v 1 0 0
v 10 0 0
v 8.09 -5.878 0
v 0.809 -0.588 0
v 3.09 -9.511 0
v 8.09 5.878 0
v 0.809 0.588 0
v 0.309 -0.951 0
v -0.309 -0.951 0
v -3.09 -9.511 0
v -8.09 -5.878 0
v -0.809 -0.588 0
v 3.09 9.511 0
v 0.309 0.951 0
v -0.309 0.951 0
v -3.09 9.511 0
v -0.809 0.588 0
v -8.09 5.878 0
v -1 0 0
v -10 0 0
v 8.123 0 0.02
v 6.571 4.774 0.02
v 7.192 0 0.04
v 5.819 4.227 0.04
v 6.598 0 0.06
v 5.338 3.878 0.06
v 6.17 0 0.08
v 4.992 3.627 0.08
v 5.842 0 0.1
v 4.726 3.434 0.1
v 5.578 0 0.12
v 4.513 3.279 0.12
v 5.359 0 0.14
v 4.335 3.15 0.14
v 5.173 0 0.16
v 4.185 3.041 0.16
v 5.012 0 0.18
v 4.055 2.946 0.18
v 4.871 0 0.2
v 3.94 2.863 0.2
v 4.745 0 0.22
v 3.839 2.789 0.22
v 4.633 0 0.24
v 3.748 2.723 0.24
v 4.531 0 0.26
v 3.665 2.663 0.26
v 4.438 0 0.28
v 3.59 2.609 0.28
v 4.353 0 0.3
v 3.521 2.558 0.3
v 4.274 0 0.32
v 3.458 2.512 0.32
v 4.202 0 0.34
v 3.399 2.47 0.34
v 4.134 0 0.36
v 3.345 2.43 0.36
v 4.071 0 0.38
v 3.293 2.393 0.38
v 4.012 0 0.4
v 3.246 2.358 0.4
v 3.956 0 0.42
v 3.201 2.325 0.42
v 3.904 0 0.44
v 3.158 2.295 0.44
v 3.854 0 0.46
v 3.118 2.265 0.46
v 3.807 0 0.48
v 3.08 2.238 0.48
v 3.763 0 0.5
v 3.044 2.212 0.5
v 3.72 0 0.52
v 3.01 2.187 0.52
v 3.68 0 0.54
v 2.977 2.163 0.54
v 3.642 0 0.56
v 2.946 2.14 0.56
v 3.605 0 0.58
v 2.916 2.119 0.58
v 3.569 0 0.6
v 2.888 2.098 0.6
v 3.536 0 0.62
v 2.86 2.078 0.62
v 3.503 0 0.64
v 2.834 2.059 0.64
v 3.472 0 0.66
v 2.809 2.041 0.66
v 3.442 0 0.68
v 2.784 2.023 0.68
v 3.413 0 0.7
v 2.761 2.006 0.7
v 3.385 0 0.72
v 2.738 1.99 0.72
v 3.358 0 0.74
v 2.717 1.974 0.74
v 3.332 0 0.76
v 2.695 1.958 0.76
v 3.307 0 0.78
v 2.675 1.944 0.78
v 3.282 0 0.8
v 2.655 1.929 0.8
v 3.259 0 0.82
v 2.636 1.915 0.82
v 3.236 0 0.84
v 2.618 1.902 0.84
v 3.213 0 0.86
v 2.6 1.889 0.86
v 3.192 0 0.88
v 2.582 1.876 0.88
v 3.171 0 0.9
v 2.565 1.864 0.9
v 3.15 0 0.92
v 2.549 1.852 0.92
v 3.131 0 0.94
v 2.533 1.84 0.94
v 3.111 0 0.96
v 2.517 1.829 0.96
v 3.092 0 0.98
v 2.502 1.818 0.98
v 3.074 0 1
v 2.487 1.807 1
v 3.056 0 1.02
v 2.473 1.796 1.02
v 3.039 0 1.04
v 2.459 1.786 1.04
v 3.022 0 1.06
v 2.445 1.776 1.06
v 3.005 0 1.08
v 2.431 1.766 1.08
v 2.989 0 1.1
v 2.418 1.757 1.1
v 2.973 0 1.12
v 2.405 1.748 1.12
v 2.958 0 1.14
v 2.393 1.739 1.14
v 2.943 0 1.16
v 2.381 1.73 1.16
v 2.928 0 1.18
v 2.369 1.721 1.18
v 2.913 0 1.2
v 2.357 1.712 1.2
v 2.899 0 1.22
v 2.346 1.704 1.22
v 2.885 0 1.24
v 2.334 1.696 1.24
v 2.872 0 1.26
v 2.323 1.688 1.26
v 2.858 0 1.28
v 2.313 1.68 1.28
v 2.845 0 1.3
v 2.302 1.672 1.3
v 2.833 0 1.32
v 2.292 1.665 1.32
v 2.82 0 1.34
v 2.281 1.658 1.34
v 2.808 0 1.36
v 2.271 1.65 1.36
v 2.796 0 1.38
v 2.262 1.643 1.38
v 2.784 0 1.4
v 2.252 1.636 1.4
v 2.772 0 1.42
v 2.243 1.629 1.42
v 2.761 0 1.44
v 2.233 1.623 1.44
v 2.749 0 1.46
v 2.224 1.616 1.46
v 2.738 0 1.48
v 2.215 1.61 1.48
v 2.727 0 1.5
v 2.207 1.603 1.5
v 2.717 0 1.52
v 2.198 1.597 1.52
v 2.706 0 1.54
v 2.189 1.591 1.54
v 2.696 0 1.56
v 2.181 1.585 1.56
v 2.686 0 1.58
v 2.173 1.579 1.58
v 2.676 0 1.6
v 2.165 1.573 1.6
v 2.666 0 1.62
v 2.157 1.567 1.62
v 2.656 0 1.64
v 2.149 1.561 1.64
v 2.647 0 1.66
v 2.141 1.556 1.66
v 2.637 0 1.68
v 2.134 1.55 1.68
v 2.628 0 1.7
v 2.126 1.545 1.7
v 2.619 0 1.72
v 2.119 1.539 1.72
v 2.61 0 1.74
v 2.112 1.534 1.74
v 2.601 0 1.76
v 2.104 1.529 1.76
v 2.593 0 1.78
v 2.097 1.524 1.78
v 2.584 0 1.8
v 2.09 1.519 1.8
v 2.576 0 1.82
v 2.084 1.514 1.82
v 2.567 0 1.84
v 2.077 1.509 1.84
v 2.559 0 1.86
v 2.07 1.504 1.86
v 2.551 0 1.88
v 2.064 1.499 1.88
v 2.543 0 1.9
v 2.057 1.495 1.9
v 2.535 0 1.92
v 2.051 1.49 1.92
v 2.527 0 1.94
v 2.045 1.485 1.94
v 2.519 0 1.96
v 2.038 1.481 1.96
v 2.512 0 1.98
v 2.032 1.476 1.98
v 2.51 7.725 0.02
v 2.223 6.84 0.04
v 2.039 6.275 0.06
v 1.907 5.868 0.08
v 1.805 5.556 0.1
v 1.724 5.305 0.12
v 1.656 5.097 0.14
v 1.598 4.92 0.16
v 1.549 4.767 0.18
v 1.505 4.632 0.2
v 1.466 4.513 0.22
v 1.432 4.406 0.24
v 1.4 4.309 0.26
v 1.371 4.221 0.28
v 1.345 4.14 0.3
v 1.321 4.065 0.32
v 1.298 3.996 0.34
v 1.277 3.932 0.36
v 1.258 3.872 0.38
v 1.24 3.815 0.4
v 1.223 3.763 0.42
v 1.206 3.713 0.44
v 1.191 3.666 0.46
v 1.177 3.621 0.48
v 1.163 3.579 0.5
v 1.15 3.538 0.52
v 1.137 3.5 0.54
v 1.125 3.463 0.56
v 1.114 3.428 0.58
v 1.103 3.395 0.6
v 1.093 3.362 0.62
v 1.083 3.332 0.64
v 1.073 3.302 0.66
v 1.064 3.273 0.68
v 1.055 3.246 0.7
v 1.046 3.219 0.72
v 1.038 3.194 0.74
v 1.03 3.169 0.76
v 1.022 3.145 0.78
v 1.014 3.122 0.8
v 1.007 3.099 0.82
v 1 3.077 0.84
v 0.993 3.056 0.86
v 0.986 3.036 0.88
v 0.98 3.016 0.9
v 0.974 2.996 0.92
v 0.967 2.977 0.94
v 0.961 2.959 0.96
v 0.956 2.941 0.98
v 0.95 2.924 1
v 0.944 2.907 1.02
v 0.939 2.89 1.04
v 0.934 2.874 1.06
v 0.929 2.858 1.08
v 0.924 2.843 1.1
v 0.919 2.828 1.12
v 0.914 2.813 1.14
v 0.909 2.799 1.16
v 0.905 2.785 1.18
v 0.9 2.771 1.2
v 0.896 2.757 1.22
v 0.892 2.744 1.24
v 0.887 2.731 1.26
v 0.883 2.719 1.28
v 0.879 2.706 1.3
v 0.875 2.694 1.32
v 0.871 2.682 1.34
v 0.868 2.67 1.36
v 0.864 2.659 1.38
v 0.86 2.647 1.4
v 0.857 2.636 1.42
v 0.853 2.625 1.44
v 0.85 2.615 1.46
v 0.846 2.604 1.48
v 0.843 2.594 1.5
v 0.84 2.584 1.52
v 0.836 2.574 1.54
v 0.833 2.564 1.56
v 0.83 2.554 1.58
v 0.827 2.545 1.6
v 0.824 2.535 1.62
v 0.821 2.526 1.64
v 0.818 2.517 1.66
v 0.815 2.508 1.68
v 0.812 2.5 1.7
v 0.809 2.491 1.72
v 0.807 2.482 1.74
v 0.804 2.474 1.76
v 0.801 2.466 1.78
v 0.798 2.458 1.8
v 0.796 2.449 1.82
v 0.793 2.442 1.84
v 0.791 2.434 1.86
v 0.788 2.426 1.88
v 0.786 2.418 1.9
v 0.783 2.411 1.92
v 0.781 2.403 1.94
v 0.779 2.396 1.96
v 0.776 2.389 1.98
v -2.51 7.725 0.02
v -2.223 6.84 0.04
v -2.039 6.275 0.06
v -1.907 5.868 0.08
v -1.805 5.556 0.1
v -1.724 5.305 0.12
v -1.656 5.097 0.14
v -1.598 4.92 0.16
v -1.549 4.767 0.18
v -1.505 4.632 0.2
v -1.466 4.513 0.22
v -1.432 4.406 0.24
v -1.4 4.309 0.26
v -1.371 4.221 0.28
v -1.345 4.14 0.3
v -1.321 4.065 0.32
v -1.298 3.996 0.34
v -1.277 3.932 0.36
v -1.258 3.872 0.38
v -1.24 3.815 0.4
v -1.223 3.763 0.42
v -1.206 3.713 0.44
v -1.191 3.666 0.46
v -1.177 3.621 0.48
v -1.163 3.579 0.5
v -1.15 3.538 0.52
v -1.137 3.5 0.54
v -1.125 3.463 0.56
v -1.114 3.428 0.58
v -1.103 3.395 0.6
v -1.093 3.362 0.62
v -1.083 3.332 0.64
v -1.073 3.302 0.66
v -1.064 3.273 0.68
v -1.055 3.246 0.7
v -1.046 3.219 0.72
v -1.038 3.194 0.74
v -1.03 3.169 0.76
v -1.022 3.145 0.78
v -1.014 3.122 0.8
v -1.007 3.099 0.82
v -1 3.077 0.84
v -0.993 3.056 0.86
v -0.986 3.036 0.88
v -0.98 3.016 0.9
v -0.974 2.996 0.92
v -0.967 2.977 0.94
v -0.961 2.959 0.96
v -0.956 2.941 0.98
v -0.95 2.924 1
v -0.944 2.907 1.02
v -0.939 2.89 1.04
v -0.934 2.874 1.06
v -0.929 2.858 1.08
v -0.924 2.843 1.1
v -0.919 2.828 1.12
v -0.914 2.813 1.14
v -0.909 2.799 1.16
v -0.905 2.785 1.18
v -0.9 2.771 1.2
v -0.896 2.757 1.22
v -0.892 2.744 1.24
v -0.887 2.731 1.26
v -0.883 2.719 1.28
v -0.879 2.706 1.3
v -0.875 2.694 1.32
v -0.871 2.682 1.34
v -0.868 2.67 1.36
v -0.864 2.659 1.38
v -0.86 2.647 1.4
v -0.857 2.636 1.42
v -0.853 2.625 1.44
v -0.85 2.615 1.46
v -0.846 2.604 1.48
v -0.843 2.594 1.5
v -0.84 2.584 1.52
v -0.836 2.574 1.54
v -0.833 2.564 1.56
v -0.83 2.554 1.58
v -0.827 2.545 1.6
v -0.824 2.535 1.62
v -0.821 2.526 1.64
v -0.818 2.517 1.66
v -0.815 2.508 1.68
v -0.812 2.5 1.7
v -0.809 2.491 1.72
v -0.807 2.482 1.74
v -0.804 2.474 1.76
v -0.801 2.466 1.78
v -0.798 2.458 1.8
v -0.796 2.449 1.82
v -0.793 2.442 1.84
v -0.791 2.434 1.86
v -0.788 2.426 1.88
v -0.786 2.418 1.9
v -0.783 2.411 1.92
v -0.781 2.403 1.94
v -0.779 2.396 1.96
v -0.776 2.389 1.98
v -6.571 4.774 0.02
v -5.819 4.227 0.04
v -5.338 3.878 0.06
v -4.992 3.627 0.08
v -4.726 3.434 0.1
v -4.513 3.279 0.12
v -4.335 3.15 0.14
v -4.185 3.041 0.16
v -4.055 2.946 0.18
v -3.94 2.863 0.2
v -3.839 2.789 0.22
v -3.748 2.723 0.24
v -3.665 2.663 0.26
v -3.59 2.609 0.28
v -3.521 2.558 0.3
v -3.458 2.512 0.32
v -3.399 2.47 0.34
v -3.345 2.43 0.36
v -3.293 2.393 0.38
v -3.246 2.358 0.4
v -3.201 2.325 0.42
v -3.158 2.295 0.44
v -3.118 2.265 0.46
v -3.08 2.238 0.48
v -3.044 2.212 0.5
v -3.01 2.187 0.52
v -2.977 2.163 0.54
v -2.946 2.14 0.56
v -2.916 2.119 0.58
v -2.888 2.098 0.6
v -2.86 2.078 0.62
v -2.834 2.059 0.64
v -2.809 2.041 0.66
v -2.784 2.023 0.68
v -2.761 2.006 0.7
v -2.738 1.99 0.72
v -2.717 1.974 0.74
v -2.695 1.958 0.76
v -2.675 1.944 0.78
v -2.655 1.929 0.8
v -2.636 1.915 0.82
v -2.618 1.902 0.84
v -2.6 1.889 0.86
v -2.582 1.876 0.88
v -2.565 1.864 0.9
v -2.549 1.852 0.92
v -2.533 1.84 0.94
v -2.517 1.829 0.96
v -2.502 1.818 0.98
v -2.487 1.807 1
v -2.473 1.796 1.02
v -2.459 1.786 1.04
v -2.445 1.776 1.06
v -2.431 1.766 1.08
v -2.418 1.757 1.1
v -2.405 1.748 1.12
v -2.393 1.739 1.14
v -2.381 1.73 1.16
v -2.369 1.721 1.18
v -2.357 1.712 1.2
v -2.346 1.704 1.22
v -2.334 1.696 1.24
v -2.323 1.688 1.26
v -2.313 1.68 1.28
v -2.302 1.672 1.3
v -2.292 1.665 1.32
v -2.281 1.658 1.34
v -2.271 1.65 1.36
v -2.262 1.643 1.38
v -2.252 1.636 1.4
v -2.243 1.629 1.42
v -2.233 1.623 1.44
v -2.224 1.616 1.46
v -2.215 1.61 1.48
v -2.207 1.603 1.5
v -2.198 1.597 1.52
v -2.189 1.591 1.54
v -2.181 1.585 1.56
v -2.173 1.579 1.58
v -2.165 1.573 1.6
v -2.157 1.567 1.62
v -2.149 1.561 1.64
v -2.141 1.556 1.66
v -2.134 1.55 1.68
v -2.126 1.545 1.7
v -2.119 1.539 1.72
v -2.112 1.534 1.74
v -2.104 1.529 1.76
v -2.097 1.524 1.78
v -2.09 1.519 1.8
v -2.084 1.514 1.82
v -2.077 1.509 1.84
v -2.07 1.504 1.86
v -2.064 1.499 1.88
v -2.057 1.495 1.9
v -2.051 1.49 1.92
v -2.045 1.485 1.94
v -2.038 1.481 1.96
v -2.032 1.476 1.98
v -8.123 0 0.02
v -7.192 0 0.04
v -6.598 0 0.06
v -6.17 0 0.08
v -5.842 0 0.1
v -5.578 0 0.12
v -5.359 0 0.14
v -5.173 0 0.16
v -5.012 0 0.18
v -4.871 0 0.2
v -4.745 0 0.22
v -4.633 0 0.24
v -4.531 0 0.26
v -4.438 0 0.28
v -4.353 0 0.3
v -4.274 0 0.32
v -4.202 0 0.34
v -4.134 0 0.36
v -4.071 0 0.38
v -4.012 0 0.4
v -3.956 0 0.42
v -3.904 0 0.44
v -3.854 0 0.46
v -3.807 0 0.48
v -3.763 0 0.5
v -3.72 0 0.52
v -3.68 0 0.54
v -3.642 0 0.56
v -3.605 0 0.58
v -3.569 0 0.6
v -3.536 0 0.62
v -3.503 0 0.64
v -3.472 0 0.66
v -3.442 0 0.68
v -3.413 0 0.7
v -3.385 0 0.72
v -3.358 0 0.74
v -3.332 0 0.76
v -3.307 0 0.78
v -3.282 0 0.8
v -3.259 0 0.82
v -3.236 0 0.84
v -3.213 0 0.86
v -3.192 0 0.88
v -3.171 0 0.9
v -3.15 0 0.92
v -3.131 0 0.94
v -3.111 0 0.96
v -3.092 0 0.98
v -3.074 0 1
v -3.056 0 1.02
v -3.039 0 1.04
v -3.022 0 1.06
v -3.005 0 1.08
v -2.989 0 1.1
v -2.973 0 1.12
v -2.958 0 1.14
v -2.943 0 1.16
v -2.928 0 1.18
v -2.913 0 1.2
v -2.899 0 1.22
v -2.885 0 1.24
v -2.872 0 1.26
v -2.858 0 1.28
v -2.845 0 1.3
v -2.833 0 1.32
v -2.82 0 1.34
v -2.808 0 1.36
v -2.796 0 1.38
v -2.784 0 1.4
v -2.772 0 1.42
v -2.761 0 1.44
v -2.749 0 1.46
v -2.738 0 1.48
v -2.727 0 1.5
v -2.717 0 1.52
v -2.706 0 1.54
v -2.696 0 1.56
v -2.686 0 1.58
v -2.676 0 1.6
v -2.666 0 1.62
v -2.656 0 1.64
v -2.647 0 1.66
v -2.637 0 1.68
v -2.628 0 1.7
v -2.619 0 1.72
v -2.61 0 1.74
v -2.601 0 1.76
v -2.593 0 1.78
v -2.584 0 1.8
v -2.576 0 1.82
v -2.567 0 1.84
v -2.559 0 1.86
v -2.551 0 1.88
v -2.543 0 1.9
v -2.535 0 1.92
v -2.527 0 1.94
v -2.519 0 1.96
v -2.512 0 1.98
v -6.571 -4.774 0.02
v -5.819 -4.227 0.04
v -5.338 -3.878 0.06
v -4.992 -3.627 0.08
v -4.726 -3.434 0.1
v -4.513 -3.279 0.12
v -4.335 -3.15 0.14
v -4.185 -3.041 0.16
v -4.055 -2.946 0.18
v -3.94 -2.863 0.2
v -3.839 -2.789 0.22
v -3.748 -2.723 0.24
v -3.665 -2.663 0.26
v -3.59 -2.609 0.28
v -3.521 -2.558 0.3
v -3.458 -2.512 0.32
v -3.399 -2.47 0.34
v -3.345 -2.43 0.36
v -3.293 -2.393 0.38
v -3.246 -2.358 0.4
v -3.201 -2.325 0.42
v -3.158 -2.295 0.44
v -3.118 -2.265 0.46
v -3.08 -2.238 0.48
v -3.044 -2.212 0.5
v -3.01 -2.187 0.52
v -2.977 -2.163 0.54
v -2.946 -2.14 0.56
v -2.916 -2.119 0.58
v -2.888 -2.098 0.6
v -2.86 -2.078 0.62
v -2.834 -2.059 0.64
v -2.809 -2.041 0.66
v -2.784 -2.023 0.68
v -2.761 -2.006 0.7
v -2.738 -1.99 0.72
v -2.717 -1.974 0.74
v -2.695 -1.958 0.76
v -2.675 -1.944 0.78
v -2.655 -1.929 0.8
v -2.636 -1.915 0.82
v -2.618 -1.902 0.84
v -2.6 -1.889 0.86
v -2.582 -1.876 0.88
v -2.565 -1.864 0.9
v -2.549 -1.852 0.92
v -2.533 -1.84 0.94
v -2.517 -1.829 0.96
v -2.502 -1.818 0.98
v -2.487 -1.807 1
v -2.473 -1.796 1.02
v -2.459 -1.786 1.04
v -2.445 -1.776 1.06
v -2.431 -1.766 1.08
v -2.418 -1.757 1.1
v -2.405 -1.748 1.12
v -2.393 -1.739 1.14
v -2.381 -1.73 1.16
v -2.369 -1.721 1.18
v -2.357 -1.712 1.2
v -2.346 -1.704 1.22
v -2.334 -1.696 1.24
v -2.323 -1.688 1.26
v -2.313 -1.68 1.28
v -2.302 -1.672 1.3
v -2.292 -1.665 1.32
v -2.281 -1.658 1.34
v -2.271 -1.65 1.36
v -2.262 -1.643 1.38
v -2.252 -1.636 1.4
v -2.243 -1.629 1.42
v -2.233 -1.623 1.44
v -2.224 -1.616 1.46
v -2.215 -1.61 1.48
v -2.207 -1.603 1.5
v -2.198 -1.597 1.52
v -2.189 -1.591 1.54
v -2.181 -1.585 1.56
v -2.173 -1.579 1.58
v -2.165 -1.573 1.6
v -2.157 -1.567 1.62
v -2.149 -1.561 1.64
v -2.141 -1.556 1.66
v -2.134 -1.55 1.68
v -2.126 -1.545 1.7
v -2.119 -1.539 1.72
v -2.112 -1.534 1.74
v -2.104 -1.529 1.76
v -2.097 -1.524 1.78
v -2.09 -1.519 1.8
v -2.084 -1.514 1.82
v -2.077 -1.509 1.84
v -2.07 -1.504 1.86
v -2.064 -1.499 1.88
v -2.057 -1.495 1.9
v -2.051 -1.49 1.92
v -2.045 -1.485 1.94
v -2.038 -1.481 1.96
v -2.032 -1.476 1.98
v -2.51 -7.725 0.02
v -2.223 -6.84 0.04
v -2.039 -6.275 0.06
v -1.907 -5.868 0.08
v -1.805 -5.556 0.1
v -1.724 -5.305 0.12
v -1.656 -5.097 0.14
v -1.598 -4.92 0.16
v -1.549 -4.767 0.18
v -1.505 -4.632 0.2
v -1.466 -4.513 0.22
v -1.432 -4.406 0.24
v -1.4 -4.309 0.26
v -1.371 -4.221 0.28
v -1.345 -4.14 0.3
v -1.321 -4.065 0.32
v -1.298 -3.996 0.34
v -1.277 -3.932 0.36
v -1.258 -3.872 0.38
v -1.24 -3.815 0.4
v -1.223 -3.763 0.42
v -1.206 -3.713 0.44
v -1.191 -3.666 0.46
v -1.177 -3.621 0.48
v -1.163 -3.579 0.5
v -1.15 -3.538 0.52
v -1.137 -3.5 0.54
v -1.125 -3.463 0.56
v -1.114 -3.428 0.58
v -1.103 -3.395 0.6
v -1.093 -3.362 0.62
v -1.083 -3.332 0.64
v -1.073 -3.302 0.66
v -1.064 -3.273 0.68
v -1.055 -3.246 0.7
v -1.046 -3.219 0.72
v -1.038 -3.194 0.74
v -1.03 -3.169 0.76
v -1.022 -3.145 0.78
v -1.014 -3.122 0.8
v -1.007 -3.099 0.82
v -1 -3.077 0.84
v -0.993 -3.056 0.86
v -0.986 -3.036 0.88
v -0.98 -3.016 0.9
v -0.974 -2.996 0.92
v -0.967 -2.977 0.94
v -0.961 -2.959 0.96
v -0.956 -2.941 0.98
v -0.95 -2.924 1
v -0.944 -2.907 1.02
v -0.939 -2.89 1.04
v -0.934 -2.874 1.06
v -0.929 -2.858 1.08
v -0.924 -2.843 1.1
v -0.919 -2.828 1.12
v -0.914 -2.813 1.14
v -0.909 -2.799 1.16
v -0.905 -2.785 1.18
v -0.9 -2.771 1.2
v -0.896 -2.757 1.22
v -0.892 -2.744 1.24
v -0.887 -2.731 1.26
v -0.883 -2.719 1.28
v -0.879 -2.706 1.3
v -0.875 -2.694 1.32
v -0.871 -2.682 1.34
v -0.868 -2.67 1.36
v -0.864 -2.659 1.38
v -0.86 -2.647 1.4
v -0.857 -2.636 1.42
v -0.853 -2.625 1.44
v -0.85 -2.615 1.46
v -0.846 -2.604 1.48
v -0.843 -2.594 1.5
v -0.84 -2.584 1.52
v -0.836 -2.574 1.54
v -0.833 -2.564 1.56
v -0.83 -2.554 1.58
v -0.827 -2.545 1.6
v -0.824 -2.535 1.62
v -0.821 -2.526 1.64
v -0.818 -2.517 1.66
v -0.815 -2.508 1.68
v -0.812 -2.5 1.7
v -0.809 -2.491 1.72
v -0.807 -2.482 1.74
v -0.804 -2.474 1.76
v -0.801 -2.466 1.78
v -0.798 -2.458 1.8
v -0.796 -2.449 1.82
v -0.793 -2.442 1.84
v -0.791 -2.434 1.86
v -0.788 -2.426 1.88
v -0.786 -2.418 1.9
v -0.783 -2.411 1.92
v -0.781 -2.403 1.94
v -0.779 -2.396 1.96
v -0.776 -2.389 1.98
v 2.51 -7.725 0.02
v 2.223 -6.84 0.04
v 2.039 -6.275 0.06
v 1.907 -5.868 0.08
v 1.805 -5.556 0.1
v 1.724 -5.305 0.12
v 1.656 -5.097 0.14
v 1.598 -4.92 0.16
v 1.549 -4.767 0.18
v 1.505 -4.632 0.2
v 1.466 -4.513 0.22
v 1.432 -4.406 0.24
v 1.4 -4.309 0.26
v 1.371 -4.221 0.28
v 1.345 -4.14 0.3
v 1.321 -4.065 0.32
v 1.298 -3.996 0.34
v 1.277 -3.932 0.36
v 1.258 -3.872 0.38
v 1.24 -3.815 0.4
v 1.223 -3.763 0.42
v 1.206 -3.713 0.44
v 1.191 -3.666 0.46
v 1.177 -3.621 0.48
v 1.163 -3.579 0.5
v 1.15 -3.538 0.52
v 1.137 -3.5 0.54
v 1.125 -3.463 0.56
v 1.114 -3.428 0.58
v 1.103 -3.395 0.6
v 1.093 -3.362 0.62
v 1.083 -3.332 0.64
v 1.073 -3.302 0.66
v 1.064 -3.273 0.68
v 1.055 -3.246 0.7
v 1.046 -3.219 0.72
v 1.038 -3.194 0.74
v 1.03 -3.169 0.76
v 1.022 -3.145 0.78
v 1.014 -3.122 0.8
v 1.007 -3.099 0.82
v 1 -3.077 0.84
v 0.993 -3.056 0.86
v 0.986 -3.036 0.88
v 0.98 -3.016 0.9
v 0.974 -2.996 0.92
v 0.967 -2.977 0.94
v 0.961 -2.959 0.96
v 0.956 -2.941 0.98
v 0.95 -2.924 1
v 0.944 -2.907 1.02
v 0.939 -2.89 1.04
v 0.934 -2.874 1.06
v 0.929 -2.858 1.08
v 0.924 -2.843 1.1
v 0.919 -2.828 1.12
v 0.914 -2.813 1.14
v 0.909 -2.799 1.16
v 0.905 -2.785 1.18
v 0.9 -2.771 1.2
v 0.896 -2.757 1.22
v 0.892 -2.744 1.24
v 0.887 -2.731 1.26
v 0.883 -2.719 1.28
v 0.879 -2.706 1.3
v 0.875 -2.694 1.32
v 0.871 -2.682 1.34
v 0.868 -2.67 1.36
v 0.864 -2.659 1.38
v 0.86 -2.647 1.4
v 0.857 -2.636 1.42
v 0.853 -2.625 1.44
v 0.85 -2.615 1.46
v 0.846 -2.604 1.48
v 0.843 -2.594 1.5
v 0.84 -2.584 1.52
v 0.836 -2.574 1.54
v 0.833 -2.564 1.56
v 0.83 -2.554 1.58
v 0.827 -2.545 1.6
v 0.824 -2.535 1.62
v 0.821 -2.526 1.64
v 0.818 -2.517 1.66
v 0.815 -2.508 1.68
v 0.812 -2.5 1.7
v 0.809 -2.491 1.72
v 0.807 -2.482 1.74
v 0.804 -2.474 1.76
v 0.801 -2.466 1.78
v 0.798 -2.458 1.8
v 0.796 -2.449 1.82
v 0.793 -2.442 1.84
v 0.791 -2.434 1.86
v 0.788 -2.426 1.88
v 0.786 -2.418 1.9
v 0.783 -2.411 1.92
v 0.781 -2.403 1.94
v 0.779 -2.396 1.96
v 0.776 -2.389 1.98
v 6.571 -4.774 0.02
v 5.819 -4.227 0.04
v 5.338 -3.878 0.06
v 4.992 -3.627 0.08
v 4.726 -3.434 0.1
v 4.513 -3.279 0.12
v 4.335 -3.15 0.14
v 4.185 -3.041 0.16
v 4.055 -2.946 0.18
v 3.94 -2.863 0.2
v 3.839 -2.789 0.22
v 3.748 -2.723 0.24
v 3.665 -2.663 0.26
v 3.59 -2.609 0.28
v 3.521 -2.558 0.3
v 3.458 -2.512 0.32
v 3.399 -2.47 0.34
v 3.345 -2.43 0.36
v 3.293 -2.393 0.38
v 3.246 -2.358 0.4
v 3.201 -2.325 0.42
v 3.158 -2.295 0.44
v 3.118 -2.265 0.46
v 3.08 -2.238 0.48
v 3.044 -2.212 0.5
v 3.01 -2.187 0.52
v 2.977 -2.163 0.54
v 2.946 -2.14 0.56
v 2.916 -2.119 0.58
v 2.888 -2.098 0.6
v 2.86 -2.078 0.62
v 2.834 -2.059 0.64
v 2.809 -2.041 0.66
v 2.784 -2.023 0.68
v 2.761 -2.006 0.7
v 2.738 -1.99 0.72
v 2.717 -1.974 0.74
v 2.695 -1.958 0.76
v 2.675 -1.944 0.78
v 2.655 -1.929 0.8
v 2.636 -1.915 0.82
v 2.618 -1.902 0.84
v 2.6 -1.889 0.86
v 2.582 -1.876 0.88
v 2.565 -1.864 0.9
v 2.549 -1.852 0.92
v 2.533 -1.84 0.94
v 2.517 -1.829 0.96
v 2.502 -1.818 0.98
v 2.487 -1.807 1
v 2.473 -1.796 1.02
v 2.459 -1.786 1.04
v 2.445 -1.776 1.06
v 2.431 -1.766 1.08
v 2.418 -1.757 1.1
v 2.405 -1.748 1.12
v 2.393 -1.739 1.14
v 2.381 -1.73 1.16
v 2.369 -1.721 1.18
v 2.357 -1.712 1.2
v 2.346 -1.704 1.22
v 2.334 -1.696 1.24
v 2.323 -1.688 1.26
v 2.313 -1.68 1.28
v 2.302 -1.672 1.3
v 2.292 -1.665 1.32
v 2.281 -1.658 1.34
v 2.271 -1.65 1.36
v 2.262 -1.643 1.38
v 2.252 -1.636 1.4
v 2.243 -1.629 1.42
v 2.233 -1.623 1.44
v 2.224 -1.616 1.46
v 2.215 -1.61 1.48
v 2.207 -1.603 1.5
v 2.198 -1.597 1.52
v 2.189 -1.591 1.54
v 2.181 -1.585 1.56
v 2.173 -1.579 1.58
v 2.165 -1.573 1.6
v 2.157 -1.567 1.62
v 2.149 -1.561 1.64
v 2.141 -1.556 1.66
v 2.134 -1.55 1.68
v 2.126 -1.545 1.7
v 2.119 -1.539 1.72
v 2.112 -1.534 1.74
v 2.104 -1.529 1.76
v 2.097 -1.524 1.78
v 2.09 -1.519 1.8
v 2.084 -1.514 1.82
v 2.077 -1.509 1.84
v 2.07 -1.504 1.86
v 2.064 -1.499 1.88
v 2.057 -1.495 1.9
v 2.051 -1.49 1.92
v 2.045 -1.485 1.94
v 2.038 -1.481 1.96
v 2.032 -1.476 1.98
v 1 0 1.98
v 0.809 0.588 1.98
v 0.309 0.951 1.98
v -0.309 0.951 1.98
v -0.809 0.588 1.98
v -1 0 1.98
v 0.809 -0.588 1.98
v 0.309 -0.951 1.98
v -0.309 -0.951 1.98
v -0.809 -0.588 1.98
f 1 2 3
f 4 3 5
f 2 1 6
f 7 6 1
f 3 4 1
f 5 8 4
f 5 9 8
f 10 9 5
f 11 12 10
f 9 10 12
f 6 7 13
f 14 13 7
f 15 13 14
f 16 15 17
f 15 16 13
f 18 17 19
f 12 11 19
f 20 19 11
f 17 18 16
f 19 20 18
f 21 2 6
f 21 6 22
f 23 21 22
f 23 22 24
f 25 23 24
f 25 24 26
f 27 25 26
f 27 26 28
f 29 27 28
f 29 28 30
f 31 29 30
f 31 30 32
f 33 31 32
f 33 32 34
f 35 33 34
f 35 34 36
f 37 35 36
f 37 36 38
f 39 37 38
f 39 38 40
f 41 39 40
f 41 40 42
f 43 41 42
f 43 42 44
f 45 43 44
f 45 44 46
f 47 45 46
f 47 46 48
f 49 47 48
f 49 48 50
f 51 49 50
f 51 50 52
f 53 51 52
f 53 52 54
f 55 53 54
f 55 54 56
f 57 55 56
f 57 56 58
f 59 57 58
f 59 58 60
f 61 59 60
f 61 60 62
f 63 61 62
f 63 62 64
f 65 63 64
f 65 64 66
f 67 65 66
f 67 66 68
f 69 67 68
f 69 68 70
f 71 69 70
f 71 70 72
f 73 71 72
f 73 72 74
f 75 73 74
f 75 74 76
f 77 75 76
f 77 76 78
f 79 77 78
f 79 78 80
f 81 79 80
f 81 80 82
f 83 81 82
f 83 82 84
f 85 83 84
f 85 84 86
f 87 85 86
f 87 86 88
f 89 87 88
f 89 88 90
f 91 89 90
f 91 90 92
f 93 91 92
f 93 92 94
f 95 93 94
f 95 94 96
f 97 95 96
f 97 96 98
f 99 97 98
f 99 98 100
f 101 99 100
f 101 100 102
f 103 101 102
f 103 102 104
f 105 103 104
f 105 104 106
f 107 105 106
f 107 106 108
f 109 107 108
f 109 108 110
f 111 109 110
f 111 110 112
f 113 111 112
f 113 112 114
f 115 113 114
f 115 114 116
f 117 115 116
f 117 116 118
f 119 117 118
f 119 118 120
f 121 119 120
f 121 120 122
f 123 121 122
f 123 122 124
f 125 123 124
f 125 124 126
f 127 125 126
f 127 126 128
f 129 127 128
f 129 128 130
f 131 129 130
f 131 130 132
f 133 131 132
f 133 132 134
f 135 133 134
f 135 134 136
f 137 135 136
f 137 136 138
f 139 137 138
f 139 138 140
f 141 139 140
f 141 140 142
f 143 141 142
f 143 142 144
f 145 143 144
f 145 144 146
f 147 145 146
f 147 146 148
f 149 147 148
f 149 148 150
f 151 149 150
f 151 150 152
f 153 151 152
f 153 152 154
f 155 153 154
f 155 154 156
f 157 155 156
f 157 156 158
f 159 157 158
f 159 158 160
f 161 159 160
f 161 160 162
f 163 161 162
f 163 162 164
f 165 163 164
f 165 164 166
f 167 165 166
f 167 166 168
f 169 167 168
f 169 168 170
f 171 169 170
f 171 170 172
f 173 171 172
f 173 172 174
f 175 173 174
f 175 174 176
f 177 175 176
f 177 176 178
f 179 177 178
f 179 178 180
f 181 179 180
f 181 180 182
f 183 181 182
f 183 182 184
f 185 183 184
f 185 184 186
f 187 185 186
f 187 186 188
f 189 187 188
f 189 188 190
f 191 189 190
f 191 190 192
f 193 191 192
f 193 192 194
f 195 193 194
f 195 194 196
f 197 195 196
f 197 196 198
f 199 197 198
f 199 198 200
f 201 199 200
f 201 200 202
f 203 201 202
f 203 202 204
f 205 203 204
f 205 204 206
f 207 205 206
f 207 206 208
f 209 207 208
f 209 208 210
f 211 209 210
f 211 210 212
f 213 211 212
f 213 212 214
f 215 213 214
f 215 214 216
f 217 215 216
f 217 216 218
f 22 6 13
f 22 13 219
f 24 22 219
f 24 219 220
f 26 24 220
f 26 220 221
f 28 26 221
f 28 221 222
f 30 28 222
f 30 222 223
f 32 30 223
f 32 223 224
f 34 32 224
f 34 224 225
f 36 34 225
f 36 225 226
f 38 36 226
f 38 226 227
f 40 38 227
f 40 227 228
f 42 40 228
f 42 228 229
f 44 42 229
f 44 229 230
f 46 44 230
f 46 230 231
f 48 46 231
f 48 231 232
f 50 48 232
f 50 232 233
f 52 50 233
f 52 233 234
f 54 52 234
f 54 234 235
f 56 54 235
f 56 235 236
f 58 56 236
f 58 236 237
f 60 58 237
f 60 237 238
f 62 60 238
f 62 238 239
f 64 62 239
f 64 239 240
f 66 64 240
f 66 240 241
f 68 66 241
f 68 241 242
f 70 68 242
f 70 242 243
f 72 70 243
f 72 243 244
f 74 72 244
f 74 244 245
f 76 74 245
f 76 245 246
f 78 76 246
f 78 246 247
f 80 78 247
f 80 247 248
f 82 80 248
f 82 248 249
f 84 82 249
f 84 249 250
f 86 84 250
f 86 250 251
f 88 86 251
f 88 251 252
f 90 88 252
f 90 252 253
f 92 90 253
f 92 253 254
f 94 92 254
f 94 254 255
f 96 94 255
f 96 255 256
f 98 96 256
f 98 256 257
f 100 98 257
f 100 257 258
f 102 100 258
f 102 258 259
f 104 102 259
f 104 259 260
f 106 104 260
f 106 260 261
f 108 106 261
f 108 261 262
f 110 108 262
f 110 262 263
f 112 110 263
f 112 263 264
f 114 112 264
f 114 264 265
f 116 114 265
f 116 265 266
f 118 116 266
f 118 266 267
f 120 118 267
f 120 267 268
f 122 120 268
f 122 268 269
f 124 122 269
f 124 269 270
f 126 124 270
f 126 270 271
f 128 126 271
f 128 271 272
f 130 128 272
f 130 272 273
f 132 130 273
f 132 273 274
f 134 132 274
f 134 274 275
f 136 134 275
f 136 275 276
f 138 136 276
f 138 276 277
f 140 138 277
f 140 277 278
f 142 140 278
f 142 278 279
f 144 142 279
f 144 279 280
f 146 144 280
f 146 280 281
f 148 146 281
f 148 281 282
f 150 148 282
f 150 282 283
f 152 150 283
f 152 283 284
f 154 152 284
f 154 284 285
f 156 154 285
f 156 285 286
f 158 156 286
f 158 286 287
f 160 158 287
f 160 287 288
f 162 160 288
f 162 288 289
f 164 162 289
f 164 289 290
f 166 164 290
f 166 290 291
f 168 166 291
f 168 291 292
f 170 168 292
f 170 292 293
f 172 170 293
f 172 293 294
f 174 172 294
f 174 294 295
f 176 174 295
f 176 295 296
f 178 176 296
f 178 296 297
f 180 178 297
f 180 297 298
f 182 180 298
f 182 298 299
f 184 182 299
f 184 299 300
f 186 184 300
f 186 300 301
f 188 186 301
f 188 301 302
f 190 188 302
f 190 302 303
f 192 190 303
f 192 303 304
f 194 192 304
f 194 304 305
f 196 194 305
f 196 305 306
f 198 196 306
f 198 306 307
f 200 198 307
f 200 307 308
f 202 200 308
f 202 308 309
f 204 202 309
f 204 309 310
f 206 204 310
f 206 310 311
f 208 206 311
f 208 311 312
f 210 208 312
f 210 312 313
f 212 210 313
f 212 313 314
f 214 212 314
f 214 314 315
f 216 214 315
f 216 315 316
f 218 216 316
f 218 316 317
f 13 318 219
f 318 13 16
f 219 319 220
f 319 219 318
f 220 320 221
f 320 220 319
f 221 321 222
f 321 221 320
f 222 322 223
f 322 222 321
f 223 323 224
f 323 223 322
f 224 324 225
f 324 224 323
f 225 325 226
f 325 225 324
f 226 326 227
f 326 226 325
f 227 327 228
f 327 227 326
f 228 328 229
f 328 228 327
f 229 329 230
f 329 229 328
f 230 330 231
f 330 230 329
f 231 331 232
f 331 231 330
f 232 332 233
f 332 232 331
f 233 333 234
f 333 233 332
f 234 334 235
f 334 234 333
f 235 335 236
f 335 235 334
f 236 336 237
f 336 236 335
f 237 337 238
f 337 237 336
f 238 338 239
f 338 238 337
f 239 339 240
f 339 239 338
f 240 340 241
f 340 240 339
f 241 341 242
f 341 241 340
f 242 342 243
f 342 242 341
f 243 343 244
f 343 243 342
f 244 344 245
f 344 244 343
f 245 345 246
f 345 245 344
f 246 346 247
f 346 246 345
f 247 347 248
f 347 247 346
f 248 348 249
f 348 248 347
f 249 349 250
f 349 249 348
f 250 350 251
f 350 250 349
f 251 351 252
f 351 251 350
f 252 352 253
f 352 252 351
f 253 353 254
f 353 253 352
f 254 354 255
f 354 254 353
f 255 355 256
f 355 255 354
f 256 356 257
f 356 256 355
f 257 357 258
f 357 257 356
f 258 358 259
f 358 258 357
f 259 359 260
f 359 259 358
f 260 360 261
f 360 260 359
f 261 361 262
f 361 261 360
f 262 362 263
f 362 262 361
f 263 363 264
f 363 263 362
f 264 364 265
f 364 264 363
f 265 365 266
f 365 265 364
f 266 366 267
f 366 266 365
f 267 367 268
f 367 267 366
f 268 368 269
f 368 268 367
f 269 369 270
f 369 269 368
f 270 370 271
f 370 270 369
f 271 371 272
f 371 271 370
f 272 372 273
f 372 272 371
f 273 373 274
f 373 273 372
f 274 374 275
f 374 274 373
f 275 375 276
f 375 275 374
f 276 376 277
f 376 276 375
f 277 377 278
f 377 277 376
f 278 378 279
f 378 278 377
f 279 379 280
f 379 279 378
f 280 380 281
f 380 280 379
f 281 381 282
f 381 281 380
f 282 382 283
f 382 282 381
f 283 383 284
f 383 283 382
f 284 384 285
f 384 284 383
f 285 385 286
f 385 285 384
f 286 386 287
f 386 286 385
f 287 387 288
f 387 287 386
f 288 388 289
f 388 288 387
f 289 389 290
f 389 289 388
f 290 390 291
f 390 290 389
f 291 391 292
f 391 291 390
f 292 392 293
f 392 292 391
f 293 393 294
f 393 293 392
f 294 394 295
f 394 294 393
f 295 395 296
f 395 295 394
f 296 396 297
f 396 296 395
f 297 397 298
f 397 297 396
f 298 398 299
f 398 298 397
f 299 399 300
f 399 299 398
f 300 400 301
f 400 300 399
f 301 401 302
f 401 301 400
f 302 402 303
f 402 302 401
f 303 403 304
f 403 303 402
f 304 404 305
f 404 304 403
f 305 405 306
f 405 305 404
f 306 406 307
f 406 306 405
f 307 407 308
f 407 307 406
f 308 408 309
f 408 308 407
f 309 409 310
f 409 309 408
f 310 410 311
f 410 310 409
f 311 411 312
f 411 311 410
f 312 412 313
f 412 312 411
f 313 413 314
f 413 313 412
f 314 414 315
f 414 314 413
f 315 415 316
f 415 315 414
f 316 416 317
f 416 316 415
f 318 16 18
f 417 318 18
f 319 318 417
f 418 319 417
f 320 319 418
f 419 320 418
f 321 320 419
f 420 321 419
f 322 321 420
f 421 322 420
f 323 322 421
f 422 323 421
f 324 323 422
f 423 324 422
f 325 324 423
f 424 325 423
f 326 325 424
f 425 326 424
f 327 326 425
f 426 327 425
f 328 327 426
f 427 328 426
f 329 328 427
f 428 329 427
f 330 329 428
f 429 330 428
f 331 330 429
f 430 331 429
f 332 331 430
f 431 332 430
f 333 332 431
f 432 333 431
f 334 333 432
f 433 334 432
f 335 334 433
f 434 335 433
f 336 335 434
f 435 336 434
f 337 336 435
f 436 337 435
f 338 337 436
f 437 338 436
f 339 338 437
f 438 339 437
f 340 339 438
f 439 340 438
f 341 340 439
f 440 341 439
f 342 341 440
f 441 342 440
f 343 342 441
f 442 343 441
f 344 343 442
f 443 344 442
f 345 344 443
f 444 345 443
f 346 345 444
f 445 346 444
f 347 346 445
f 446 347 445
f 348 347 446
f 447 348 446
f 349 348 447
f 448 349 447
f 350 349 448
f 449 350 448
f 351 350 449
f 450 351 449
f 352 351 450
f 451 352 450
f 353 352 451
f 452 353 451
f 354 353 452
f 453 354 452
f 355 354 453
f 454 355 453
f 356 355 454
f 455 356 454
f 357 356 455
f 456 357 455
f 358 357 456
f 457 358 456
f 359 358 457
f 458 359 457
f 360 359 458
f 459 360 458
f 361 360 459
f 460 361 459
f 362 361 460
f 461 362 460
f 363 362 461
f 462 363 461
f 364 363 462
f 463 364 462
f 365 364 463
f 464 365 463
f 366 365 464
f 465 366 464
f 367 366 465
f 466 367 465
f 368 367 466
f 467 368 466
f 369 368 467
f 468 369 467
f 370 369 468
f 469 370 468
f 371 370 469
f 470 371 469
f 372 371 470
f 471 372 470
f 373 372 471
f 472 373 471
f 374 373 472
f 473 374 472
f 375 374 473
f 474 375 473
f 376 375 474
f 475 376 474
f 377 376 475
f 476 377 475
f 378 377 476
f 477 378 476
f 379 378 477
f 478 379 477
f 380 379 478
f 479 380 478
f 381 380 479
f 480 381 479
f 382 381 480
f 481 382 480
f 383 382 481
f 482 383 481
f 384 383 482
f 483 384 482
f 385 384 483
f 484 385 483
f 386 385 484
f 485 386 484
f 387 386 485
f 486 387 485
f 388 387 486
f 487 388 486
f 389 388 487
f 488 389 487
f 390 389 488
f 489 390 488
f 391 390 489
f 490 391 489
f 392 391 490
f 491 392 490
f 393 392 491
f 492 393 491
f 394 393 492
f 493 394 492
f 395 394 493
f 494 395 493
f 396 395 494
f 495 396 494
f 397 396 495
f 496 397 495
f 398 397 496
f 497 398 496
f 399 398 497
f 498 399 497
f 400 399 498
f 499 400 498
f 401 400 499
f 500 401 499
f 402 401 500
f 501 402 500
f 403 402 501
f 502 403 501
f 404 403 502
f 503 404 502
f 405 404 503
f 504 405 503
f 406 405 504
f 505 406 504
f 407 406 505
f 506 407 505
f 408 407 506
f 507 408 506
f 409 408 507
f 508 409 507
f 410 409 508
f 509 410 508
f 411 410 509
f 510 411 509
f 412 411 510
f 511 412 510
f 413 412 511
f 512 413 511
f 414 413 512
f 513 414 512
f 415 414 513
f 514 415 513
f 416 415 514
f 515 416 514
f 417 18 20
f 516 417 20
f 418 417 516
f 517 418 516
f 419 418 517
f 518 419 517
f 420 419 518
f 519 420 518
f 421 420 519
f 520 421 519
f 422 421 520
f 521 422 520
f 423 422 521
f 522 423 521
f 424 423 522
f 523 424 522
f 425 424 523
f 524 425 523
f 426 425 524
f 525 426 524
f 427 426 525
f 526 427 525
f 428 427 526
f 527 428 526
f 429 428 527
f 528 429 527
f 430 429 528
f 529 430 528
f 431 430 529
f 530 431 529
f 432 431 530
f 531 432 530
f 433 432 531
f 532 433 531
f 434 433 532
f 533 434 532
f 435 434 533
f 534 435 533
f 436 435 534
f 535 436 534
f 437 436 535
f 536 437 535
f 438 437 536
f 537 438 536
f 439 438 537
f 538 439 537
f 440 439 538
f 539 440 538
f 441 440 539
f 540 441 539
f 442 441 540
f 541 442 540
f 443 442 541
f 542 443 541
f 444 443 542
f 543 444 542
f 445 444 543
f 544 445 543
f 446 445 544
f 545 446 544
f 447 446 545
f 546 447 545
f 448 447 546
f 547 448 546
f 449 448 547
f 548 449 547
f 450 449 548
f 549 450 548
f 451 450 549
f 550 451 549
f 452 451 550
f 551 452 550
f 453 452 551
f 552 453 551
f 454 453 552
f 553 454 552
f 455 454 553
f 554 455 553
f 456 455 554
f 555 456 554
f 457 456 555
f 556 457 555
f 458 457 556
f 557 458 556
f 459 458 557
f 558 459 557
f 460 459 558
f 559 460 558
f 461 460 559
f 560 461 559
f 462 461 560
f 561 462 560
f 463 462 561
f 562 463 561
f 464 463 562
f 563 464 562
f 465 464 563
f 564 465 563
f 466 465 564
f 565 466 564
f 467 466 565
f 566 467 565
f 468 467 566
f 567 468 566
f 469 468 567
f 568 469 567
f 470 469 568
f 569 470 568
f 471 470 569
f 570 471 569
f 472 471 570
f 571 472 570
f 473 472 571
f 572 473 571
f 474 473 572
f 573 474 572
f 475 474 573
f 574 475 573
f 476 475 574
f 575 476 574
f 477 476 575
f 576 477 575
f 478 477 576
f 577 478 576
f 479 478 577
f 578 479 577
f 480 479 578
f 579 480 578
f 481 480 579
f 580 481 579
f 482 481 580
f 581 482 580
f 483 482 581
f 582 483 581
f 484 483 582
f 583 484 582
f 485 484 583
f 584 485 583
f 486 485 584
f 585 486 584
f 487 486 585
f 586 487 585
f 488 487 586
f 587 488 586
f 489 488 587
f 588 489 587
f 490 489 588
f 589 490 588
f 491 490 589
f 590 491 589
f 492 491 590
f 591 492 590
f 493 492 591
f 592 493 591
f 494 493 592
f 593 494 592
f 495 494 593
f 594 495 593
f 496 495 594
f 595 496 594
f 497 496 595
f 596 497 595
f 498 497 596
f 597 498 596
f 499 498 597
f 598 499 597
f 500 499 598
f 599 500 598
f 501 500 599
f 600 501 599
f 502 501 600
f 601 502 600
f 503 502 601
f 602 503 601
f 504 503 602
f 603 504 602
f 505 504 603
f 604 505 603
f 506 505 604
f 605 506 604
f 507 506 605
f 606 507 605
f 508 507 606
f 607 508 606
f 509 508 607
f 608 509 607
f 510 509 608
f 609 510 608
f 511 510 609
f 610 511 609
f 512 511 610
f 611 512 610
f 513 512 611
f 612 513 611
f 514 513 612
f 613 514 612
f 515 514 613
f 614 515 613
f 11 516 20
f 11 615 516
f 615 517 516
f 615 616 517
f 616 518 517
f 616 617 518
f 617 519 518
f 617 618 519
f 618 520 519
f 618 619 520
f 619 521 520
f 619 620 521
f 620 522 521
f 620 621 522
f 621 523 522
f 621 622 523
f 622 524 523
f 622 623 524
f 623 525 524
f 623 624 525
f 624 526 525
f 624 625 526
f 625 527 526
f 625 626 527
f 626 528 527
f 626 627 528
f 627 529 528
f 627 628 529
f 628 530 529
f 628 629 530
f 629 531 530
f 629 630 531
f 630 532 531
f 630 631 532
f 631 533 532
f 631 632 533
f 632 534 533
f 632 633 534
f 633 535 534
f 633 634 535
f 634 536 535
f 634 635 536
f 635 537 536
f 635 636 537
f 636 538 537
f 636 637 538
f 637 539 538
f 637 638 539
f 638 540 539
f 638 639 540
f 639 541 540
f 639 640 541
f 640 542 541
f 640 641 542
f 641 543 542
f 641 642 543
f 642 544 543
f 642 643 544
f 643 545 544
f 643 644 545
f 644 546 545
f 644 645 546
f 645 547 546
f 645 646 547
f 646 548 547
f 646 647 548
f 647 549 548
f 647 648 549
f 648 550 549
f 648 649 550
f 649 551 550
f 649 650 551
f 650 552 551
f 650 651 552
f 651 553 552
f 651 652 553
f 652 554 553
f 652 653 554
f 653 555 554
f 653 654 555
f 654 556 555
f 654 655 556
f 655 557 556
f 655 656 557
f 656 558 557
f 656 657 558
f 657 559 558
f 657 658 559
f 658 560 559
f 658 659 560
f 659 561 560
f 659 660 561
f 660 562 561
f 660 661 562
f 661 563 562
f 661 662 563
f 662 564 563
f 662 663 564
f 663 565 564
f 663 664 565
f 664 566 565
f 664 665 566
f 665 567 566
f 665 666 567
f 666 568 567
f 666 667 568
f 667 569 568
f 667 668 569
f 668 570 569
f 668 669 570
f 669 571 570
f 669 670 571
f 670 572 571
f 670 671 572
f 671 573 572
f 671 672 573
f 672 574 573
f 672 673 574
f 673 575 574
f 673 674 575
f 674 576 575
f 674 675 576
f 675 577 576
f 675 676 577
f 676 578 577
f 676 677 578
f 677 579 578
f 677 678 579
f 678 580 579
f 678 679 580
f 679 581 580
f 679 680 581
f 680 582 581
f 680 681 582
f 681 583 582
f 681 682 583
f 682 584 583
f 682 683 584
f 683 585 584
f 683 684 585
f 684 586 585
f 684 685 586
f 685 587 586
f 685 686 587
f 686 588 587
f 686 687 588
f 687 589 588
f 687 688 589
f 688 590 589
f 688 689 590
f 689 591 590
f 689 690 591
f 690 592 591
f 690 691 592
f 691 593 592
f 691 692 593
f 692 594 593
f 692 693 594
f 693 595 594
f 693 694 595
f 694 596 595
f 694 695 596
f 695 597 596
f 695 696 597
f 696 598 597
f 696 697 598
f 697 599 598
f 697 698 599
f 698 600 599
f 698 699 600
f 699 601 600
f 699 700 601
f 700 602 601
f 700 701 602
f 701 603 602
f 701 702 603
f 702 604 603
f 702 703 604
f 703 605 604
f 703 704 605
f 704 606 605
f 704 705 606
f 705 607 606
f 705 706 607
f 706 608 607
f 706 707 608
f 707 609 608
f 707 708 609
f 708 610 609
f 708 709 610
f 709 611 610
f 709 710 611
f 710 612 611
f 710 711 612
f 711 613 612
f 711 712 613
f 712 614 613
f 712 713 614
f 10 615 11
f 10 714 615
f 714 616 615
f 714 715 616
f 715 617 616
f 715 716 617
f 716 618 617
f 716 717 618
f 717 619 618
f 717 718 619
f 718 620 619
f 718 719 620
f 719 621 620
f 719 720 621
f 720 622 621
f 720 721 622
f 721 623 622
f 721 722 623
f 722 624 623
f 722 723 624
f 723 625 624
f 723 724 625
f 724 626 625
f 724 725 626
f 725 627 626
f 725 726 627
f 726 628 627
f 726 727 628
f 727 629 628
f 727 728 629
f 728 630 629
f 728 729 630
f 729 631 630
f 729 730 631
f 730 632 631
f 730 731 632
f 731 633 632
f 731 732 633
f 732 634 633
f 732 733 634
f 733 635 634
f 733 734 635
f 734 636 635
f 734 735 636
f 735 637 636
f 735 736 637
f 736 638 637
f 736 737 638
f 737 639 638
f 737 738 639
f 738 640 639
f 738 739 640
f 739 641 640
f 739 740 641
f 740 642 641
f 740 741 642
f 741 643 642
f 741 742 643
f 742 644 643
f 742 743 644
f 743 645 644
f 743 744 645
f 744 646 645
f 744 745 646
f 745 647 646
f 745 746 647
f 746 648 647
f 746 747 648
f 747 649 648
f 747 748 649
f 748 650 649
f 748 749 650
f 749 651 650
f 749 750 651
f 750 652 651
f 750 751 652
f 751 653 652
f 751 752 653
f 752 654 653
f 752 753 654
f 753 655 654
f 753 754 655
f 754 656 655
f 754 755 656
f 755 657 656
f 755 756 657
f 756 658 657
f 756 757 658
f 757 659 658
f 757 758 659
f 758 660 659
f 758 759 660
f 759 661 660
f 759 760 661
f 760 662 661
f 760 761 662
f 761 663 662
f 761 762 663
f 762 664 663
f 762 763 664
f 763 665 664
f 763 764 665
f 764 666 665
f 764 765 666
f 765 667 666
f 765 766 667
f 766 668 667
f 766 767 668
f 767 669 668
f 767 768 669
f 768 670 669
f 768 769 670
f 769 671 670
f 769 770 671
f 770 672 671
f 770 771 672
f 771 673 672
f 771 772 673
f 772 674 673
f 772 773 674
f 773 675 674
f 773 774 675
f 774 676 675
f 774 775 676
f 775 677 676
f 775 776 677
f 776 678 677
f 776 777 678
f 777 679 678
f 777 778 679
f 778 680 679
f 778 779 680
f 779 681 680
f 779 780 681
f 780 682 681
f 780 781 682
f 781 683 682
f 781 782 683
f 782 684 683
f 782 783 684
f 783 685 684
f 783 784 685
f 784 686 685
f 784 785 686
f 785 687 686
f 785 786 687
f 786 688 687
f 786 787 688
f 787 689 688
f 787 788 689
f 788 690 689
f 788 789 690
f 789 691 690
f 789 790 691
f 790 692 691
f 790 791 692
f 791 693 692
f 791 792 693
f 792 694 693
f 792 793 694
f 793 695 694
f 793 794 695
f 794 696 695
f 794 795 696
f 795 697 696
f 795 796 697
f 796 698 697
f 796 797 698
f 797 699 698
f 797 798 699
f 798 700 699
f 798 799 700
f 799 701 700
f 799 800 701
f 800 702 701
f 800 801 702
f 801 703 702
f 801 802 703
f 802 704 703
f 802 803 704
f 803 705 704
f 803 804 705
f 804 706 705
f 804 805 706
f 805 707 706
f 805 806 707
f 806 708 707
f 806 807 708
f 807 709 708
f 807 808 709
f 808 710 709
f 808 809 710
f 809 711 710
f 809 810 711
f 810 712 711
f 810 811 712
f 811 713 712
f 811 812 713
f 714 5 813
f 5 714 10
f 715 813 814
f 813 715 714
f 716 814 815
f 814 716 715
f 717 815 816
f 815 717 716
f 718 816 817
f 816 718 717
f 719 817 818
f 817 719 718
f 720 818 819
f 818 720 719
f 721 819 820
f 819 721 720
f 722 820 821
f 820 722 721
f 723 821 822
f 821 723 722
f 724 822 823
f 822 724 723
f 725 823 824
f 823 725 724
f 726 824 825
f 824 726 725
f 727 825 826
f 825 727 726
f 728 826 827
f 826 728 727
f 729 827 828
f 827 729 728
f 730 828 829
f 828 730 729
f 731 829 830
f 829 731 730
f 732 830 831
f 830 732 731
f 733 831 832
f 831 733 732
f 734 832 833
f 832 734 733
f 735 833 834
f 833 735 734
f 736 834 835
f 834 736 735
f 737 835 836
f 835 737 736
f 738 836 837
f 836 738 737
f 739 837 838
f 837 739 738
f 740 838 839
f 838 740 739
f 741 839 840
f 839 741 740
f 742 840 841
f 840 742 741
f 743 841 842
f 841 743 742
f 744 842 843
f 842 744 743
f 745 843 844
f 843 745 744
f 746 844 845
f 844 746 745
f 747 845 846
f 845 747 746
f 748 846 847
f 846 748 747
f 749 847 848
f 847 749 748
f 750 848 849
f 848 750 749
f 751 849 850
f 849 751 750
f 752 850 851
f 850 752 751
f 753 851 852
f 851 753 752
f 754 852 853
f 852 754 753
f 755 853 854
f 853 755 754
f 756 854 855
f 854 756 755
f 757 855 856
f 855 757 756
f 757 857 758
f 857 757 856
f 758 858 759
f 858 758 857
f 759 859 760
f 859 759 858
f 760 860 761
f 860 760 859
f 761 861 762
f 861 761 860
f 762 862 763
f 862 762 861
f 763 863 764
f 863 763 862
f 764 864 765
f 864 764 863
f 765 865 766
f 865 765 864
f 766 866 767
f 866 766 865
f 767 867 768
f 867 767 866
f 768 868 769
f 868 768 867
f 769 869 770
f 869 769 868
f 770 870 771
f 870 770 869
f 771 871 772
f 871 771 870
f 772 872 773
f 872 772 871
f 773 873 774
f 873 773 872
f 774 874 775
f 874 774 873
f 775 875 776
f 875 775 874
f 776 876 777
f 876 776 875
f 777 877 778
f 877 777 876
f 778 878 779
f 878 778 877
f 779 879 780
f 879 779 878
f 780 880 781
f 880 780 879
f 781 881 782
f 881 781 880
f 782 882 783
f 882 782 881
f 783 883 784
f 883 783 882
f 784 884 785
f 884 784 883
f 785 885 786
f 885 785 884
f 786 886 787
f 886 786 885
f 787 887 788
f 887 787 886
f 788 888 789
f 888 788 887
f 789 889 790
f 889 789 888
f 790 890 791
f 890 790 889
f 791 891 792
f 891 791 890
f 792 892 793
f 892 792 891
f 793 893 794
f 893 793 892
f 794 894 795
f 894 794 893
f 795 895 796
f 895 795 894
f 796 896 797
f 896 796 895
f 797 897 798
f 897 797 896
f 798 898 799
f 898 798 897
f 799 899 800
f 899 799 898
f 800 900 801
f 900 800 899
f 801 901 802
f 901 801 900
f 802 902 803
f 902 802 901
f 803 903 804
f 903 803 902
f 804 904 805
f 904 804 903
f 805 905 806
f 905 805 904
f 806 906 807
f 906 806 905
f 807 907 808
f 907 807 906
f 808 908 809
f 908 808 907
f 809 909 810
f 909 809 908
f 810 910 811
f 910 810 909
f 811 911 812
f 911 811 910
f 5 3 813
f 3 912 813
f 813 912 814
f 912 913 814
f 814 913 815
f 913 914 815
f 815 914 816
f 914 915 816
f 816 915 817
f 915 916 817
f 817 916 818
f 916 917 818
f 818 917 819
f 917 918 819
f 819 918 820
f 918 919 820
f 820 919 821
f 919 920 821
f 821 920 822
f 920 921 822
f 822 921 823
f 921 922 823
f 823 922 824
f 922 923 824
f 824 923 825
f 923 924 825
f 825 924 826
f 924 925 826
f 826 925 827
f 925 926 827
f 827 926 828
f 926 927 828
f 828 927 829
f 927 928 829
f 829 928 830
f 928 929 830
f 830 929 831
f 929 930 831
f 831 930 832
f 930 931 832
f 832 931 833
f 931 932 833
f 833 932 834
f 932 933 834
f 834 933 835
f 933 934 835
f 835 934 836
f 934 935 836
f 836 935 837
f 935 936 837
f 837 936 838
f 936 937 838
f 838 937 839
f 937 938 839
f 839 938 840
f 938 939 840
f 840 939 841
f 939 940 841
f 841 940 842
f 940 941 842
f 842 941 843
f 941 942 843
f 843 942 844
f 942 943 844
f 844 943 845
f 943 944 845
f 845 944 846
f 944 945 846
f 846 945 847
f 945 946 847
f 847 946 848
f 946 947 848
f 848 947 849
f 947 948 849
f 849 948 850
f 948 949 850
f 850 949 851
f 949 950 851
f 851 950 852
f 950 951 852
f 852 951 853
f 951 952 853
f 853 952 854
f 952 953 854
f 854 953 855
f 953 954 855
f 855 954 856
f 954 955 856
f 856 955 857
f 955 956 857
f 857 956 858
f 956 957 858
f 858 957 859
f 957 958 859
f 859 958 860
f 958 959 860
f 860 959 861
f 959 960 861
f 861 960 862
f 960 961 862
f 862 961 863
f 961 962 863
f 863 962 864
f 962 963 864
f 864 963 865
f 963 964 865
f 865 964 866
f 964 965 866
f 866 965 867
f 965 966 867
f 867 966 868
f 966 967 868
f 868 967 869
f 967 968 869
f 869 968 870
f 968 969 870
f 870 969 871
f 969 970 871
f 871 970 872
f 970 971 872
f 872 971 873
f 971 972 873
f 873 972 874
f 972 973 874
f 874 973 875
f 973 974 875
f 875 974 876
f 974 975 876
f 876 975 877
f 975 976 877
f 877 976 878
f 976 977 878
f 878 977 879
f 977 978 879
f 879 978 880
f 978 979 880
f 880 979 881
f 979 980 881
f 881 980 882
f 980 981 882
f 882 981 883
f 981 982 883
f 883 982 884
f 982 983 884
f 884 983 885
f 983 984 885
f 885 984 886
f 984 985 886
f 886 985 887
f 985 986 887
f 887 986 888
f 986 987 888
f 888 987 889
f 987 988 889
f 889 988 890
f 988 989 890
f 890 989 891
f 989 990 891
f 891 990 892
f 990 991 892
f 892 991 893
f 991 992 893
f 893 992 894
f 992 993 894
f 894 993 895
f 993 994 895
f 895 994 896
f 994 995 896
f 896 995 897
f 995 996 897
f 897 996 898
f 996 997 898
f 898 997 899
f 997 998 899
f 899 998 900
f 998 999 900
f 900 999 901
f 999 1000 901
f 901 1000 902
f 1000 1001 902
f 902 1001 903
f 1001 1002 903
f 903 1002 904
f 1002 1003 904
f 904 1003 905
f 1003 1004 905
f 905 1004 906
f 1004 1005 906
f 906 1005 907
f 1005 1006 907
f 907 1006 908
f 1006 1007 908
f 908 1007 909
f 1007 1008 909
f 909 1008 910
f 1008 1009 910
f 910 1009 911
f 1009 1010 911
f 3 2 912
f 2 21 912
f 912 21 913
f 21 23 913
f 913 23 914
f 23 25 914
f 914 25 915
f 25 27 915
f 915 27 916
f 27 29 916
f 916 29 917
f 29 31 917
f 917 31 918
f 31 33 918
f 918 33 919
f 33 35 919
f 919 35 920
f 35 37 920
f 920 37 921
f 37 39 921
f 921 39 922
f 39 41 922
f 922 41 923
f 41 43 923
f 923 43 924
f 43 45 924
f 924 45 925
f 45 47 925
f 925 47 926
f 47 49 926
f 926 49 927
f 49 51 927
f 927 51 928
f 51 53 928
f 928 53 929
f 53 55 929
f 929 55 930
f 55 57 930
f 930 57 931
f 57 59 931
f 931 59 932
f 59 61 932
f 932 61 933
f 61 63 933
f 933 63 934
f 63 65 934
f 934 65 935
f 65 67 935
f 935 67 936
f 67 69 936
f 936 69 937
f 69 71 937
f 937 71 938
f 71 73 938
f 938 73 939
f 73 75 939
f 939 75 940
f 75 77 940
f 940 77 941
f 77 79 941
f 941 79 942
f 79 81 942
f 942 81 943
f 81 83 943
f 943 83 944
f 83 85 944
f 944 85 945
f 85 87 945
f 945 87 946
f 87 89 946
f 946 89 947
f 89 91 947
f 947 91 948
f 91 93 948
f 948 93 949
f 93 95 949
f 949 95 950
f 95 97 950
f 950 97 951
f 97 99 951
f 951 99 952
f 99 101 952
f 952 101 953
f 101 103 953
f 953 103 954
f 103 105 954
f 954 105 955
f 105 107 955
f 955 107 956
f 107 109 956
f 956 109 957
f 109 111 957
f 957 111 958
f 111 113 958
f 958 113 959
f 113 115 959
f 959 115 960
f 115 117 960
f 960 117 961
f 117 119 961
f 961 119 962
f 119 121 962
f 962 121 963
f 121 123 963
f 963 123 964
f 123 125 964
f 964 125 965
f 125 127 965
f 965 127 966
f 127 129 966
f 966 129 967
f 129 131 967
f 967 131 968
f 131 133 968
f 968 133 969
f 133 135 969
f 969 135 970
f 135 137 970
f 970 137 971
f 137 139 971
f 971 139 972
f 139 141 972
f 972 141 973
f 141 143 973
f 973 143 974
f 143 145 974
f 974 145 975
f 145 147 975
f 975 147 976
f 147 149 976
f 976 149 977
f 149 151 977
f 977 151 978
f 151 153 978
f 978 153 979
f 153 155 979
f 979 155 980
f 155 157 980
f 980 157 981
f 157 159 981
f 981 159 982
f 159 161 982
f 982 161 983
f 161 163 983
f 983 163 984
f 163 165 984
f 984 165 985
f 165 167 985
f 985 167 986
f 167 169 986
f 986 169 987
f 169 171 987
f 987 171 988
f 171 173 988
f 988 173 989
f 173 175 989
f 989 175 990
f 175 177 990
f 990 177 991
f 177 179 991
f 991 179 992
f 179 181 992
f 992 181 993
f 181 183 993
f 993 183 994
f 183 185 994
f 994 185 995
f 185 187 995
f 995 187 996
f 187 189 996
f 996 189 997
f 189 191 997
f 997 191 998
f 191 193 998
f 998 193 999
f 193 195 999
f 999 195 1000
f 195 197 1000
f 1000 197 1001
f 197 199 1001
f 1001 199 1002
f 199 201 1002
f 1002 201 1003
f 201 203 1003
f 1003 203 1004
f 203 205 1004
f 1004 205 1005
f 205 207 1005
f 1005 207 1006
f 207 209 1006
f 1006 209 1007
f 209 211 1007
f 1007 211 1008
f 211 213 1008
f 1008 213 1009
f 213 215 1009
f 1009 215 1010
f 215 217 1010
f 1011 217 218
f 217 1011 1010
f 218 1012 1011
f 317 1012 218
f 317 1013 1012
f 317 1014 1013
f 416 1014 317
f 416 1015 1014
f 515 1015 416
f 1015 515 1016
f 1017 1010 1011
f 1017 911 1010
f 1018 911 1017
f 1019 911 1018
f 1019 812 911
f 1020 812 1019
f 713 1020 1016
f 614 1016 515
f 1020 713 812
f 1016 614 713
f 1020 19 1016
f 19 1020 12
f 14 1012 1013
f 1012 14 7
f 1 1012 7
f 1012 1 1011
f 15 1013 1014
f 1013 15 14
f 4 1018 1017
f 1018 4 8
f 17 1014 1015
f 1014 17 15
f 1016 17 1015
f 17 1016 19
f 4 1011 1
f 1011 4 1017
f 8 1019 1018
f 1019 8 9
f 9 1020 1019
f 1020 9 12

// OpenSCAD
// Reverse Slicer 
// build a complex shape from user definable functions 
// as a faster alternative to multiple unions 


// Start user definable data

$fn=10; 

Slices=100;

// angle by which each slice is tilted, currently not implemented 
SliceAngle=[for(i=[0:1:Slices-1]) [3.6*i,0,0]];

// position of each slice relative to origin 
SlicePosition=[for(i=[1:1:Slices]) [0,0,(i-1)/50]];

SliceRadius=[for(i=[1:1:Slices]) 10/pow(i,.3)]; 

// returns a list of vertices, called a slice, centered around the origin, by which a circle of radius r and height 0 will be approximated 
function CircularSlice(r=1)=[let(Step=360/$fn) for(i=[0:1:$fn-1]) [r*cos(i*Step),r*sin(i*Step),0]];

// End user definable data 


// Start generating list 

// list of all slices needed to construct shape 
Offset_X=flatten([
	for(i=[0:1:Slices-1])
		MinElement_X(CircularSlice(SliceRadius[i]))
]);

// list of all slices needed to construct shape 
VertexList=flatten([
	for(i=[0:1:Slices-1])
		MoveSlice(CircularSlice(SliceRadius[i]),SlicePosition[i])
]);

// list of all triangular faces needed to close shape at one end 
EndFace1=[for(i=[2:1:$fn-1]) [0,i-1,i]];

// list of all triangular faces needed to close shape at other end 
EndFace2=[let(F=(Slices-1)*$fn) for(i=[F:1:F+$fn-3]) [F,i+2,i+1]];

SideFaces=flatten([
	for(i=[0:1:$fn-1])
		for(k=[0:1:Slices])
			[
				[i+k*$fn, (i+$fn)+k*$fn, ((i+1)%$fn)+k*$fn],
				[((i+1)%$fn)+k*$fn, (i+$fn)+k*$fn, ((i+1)%$fn+$fn)+k*$fn]
			]
]);

FacesList=concat(EndFace1,SideFaces,EndFace2); 

// Element of slice farthest out on negative y axis, defines distance of tilting (rotation) axis from x axis 
function MinElement_X(Sl,A)=min([for(i=[0:1:$fn-1]) let (m=ExtractSlice(Sl,i)) m[1]]);

function flatten(l)=[for (a=l) for (b=a) b] ;

// extract a vector from a slice 
function ExtractSlice(List,Element)=flatten([for(i=Element) List[i]]);

// move slice to [x,y,z]
function MoveSlice(Sl,SP)=[for(i=[0:1:$fn-1]) let (v=ExtractSlice(Sl,i)) [v[0]+SP[0], v[1]+SP[1], v[2]+SP[2]]];

// end generating list

// generate shape from list
difference() {   // test for CSG compatibility 
polyhedron(VertexList,FacesList); 
cylinder(h=1000,r=1);} 
